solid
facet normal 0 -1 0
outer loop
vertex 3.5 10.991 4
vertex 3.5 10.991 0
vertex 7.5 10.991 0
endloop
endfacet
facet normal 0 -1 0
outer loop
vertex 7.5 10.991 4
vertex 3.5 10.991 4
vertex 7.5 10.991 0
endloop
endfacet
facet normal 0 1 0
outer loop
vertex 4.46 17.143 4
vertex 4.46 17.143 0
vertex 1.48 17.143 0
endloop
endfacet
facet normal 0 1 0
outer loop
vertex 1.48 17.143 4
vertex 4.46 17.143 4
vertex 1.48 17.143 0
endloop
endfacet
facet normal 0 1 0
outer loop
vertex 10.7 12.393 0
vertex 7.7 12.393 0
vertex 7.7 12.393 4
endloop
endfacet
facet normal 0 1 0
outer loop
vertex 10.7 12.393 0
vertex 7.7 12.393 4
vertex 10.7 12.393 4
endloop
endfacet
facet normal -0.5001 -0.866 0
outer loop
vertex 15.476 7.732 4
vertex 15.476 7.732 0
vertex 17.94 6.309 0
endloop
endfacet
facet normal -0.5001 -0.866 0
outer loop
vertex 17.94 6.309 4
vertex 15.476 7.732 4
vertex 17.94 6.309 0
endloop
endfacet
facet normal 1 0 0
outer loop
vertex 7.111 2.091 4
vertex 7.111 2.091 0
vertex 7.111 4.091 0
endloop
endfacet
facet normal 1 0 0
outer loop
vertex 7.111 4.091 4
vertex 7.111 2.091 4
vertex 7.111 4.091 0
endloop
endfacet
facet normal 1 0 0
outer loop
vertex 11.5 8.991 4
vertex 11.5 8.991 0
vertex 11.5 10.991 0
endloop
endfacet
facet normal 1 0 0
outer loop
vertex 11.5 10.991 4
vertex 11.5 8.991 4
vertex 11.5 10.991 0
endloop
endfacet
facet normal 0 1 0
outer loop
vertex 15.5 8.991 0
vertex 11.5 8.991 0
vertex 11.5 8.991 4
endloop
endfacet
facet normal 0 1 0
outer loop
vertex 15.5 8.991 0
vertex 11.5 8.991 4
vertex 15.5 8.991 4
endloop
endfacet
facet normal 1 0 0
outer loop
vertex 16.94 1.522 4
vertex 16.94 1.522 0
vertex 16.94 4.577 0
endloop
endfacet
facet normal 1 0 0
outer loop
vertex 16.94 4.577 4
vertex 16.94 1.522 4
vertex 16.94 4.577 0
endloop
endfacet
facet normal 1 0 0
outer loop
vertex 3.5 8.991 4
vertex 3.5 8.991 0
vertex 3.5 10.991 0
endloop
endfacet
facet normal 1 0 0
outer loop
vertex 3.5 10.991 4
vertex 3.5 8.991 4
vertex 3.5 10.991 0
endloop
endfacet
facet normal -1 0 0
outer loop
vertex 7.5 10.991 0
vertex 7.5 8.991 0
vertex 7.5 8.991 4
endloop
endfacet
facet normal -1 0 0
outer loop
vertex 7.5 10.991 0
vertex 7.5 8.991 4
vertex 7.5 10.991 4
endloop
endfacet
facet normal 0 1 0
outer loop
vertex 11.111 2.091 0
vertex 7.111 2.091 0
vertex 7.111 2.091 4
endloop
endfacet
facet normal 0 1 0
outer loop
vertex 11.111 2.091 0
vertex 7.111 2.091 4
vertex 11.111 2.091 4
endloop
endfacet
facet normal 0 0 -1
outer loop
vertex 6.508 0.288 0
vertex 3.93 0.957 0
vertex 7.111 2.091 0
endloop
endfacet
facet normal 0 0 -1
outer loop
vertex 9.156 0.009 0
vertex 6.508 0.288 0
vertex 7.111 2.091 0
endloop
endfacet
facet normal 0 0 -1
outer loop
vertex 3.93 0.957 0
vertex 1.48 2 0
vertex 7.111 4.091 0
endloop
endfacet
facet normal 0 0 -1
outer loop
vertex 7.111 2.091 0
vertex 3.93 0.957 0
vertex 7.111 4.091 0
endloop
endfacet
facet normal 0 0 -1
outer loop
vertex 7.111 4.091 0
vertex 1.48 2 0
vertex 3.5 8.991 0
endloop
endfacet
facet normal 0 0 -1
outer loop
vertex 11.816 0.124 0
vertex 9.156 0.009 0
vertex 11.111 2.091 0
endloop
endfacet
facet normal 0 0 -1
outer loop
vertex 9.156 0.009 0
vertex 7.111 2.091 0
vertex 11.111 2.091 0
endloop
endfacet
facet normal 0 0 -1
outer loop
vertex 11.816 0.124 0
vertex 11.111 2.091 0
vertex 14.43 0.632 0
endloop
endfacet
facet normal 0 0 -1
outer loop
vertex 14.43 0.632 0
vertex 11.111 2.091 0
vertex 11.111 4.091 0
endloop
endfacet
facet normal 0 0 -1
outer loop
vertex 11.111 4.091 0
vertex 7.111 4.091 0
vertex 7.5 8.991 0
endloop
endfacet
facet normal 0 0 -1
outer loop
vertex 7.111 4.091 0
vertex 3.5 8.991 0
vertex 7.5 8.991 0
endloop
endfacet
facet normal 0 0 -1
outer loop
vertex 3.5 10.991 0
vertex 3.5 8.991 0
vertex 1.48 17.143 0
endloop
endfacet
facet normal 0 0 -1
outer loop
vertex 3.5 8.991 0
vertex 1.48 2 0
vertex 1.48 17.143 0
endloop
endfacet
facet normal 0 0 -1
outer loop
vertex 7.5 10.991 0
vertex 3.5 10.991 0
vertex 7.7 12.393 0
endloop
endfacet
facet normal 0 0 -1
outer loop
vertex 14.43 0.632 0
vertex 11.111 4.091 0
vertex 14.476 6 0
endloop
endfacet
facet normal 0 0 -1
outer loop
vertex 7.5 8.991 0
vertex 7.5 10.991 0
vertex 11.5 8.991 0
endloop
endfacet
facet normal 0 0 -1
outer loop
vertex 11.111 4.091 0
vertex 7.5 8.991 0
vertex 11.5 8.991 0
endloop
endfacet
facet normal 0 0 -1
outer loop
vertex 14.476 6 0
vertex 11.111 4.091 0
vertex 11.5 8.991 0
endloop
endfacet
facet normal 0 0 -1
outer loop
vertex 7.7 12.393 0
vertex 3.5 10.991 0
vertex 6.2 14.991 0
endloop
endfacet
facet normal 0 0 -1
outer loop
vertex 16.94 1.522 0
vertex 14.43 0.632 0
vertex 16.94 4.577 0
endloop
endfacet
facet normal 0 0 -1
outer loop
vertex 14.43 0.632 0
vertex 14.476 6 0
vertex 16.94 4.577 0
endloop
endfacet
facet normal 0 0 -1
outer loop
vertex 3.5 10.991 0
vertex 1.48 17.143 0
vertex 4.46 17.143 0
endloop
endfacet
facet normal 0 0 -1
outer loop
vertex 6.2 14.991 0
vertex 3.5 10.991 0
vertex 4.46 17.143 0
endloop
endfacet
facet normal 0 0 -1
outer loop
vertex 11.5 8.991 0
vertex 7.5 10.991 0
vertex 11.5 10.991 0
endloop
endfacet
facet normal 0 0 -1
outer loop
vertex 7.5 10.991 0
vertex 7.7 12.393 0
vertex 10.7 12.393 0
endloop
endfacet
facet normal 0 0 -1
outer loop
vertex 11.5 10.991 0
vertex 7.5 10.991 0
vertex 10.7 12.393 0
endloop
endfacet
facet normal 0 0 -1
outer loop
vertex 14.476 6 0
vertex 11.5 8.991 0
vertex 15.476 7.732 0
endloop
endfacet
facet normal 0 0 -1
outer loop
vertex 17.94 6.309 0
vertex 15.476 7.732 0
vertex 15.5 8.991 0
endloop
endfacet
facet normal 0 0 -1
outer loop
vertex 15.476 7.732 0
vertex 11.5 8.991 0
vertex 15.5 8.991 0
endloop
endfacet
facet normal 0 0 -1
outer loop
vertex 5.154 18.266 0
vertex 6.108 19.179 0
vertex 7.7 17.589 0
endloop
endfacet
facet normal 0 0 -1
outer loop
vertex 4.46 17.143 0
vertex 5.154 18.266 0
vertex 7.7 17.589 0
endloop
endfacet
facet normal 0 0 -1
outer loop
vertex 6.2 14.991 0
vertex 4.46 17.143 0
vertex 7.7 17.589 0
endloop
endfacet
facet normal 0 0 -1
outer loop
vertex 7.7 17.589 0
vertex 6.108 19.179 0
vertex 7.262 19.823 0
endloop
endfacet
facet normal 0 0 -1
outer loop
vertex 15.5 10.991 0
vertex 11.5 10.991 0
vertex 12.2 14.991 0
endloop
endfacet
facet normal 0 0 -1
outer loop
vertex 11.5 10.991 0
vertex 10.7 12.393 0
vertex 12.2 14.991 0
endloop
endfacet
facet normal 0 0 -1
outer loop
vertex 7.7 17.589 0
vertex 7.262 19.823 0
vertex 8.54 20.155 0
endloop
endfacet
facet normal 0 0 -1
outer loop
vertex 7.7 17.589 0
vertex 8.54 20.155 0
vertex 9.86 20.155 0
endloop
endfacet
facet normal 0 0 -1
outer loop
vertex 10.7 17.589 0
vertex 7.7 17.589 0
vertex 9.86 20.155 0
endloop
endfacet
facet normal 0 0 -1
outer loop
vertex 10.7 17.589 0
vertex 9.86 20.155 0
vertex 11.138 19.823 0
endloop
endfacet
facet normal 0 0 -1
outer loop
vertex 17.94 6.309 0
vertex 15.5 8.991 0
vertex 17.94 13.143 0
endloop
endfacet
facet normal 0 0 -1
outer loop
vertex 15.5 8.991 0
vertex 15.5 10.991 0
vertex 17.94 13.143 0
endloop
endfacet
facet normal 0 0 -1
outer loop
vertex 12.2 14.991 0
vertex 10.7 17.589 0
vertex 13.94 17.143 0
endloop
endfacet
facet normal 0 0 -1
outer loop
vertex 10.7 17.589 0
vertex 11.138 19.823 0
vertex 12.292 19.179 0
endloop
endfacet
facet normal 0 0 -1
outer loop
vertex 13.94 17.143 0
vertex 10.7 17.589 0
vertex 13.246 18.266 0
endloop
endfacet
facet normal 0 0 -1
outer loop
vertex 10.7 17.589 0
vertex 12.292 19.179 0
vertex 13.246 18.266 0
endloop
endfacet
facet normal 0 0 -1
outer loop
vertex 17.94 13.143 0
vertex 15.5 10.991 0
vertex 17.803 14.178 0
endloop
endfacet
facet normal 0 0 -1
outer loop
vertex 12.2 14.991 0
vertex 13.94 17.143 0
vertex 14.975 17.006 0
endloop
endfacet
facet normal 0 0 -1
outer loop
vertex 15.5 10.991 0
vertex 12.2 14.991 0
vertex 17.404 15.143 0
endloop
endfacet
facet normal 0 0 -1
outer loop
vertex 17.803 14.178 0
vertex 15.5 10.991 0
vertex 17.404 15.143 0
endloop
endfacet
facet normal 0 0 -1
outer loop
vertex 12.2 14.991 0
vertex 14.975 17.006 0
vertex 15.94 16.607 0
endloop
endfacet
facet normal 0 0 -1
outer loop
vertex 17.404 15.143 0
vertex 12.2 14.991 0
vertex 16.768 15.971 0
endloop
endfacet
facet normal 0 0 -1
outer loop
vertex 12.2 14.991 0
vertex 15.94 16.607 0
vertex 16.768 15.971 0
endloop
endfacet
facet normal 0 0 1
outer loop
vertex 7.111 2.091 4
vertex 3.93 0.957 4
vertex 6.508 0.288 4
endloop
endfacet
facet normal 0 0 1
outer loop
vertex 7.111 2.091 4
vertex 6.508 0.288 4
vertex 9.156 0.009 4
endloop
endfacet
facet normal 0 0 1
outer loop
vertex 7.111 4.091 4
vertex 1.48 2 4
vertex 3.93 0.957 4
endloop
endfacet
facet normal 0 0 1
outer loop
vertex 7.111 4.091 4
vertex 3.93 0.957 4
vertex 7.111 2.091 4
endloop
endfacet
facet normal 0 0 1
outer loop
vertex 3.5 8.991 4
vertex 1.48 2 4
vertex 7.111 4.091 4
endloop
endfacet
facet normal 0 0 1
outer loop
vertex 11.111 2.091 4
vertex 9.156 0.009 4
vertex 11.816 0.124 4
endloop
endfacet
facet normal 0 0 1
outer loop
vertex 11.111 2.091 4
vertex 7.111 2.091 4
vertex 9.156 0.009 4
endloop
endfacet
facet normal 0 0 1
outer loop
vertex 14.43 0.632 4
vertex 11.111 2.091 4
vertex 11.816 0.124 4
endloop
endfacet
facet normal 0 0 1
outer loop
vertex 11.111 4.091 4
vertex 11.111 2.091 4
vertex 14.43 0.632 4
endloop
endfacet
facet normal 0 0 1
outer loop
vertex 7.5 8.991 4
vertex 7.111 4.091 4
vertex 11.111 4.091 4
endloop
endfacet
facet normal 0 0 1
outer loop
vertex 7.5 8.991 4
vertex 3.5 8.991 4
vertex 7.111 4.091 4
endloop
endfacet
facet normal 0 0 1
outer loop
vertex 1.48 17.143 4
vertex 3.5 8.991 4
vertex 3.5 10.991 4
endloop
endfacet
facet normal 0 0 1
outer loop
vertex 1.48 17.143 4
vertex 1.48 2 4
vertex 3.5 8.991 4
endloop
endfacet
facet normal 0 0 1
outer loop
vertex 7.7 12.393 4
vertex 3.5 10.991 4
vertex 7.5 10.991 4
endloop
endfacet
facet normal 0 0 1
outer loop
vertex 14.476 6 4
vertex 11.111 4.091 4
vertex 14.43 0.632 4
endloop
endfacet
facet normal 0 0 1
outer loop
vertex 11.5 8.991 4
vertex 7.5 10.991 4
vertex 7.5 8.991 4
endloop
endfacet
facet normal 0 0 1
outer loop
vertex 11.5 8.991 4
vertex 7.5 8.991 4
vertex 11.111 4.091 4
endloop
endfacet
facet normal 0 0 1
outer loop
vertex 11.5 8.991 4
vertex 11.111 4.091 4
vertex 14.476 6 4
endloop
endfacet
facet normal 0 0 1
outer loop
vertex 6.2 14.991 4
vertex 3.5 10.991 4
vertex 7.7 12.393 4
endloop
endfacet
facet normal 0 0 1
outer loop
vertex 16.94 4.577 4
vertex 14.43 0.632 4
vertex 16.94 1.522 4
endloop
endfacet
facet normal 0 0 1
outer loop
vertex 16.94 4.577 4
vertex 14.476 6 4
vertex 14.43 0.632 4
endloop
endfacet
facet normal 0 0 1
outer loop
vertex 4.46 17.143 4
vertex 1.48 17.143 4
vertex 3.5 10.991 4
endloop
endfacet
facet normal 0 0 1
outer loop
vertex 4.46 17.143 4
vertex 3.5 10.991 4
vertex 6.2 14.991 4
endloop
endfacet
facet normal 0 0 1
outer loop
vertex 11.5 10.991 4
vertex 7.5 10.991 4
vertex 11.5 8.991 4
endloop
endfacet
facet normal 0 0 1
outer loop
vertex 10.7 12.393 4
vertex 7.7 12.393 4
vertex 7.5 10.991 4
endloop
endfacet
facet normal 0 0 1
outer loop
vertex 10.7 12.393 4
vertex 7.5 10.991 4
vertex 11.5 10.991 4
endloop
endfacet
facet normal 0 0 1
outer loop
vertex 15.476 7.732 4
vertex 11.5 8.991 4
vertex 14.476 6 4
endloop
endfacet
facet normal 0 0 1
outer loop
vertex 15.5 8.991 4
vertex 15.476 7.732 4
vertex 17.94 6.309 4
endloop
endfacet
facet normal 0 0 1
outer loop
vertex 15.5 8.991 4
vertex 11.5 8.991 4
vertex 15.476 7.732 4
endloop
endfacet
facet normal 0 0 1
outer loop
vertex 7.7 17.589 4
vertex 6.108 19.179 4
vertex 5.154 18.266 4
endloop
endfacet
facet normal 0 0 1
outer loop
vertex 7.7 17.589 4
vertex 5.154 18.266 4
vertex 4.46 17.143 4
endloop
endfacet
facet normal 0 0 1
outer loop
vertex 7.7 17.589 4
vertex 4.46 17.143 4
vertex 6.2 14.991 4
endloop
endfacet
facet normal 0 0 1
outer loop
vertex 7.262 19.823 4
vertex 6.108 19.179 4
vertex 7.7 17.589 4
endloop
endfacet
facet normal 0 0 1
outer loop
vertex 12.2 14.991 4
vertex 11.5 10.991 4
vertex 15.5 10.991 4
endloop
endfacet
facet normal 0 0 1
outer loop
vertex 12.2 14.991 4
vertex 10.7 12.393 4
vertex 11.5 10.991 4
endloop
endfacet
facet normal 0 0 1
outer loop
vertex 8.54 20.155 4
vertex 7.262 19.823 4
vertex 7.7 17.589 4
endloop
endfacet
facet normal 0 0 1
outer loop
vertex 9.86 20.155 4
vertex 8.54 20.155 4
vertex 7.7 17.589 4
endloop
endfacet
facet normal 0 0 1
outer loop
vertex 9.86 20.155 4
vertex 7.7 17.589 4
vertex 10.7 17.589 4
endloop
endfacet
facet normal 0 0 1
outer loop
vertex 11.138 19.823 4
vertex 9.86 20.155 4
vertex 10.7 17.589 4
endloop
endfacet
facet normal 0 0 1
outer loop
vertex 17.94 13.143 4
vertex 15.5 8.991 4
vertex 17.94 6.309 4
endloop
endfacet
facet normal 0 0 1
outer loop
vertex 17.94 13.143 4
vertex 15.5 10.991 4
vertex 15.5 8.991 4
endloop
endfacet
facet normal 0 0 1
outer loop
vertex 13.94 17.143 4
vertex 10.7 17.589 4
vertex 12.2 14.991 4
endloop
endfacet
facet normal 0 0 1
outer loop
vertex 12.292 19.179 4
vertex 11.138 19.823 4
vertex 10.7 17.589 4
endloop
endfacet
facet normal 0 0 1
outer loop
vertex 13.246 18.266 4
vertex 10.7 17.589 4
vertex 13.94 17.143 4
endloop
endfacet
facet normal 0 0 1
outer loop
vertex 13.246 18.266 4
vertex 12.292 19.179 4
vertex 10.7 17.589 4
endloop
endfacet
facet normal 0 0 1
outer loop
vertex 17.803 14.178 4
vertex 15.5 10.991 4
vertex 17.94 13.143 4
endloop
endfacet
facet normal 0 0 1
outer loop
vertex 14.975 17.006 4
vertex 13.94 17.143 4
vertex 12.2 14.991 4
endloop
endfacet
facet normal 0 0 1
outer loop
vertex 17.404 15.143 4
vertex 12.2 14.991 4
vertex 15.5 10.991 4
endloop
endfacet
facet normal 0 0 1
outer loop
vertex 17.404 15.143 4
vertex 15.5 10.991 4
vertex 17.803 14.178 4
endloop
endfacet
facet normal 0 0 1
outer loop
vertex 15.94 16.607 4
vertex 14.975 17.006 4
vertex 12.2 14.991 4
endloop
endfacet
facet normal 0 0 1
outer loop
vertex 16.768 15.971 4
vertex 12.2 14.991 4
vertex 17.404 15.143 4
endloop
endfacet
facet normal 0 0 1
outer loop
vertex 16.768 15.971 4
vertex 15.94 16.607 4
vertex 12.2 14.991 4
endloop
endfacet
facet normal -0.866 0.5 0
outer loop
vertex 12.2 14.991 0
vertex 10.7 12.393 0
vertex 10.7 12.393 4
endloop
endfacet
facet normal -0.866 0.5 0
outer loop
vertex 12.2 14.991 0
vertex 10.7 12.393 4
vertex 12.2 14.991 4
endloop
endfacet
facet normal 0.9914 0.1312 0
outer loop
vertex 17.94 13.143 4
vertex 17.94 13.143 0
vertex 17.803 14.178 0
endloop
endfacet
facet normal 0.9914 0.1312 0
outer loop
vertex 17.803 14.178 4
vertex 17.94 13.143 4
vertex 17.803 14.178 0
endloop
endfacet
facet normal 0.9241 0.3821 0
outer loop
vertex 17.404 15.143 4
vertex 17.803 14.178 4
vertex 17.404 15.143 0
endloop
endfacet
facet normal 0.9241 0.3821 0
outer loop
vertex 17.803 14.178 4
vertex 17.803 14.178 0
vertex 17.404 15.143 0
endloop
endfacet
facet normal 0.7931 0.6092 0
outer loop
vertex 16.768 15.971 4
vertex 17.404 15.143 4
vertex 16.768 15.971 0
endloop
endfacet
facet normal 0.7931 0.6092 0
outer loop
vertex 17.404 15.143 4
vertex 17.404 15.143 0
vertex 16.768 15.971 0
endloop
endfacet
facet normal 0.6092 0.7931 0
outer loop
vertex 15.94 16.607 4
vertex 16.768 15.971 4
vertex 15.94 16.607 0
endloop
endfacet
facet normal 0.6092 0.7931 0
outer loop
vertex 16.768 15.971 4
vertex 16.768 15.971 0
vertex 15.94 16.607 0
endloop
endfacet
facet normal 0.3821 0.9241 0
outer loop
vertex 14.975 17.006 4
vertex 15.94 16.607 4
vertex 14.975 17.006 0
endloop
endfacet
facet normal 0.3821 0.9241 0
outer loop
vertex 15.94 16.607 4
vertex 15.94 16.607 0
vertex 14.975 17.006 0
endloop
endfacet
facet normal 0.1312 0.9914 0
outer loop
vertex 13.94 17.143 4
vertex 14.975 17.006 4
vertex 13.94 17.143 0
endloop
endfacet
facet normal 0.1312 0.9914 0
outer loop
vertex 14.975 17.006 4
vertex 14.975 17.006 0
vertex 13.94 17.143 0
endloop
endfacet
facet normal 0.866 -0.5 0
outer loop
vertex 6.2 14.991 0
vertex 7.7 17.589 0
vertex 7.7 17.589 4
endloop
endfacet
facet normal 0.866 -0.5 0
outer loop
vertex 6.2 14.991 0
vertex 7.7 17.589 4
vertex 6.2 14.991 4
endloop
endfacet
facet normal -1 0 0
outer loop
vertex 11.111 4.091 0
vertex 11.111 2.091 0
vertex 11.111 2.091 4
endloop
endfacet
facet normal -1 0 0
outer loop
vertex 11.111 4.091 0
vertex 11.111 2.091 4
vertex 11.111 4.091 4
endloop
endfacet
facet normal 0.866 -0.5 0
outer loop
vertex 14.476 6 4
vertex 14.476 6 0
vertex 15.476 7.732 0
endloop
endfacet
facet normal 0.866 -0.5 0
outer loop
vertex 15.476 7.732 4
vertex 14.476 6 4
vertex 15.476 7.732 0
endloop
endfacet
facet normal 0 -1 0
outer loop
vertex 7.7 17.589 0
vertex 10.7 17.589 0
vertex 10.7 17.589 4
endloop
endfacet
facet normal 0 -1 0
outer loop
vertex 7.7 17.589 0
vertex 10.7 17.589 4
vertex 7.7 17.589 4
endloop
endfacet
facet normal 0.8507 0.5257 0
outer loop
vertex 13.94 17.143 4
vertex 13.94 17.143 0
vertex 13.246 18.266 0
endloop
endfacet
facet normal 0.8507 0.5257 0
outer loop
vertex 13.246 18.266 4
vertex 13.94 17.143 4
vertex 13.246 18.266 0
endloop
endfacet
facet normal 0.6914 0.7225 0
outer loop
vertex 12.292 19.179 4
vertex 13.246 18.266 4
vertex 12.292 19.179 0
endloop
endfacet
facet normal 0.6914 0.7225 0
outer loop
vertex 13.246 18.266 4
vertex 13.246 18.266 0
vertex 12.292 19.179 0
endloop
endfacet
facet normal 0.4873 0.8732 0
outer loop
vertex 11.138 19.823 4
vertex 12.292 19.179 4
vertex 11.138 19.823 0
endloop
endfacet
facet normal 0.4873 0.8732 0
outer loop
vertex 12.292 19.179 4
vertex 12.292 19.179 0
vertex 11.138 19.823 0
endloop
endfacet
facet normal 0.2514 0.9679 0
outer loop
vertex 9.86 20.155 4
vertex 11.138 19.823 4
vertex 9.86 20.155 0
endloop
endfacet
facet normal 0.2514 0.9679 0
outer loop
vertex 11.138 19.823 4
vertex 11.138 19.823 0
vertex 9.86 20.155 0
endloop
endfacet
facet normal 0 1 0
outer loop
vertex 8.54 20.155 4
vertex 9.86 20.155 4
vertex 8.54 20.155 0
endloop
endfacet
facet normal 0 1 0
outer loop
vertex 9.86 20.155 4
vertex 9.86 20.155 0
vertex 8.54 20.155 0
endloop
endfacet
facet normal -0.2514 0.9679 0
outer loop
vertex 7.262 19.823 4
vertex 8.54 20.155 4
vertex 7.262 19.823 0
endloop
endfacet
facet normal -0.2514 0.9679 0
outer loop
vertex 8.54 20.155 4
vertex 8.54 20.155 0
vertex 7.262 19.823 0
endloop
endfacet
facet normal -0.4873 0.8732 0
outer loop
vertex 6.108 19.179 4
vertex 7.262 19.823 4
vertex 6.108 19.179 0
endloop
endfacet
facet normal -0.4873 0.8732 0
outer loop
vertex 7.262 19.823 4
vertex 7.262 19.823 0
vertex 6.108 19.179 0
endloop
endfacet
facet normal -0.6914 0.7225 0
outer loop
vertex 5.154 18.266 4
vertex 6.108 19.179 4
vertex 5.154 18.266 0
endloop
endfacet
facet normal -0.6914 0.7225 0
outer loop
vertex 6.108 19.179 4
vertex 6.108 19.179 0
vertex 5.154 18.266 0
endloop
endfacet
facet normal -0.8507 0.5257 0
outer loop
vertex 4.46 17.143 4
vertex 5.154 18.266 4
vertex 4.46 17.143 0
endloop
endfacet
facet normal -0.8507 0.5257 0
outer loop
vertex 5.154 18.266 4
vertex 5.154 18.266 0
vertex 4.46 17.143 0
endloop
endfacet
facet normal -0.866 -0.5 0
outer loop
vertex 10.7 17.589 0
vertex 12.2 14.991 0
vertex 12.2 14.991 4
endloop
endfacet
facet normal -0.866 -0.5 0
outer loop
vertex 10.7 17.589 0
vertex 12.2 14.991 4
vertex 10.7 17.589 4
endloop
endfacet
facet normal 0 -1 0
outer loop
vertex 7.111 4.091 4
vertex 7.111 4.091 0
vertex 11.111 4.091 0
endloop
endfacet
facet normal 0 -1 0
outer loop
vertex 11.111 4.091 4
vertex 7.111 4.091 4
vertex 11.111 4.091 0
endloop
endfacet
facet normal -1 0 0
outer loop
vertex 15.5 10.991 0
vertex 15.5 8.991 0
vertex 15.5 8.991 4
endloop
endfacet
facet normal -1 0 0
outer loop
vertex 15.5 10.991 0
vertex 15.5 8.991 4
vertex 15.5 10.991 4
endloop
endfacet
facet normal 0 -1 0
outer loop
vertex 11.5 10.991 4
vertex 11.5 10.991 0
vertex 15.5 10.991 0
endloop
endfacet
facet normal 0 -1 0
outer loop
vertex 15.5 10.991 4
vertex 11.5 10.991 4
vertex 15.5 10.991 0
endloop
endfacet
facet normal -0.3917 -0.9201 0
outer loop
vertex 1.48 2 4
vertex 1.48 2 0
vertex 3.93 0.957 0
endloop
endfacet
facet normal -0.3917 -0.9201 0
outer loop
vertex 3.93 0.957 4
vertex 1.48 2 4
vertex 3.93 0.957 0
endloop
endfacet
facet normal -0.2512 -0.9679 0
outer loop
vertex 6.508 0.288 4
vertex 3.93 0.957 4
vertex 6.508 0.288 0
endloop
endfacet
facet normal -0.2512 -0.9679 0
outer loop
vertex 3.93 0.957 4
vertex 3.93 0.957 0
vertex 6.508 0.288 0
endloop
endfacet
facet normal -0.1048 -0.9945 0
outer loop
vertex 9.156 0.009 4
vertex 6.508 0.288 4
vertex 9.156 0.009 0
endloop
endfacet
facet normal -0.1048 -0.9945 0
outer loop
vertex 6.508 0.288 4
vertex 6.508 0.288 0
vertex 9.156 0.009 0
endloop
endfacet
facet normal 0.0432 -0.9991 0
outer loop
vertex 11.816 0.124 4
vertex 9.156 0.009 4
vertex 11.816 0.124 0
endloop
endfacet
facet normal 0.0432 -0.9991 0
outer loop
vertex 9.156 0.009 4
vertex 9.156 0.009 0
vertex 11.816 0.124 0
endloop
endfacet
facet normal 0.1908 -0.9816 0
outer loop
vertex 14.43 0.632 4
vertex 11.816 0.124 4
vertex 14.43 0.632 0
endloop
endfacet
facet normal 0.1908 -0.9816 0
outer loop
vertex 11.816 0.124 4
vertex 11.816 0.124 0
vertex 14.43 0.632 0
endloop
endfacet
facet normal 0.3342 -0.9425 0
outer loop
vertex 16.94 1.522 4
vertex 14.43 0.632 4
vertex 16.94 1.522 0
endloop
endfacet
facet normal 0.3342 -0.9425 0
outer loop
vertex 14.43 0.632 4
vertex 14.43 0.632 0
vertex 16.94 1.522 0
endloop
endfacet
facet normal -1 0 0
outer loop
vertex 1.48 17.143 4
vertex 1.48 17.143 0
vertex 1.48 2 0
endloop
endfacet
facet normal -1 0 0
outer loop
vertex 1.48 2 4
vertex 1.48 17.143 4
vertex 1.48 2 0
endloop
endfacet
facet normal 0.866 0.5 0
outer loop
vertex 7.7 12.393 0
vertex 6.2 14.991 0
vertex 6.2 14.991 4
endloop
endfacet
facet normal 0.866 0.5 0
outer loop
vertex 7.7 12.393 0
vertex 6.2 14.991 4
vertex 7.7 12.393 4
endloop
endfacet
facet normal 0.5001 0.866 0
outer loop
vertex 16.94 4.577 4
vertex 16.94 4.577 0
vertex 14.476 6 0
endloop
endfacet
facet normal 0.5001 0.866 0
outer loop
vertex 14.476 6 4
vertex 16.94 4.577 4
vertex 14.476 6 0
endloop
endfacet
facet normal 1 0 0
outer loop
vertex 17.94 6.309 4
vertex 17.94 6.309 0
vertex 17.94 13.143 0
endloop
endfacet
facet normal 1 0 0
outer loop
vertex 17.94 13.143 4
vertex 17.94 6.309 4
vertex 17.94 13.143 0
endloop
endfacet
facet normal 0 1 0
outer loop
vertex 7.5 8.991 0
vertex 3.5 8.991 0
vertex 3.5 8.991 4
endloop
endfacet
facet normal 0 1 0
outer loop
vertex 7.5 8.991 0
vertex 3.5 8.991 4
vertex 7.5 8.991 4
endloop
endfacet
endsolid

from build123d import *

# Parameters (mm, degrees)
SKETCH1_W           = 4
SKETCH1_H           = 2
BOSS_EXTRUDE1_DEPTH = 4


with BuildPart() as part:
    # Sketch1 → Boss-Extrude1 (new body)
    with BuildSketch(Plane.XY):
        with BuildLine():
            Line((14.475572066, 6), (15.475572066, 7.732050808))
            Line((15.475572066, 7.732050808), (17.939673681, 6.309401077))
            Line((17.939673681, 6.309401077), (17.939673681, 13.142551265))
            ThreePointArc((17.939673681, 13.142551265), (16.768100806, 15.97097839), (13.939673681, 17.142551265))
            ThreePointArc((13.939673681, 17.142551265), (9.2, 20.197069168), (4.460326319, 17.142551265))
            Line((4.460326319, 17.142551265), (1.48, 17.142551265))
            Line((1.48, 17.142551265), (1.48, 2))
            ThreePointArc((1.48, 2), (9.155654032, 0.008565204), (16.939673681, 1.522010102))
            Line((16.939673681, 1.522010102), (16.939673681, 4.577350269))
            Line((16.939673681, 4.577350269), (14.475572066, 6))
        make_face()
        with Locations((5.5, 9.99107808)):
            Rectangle(SKETCH1_W, SKETCH1_H, mode=Mode.SUBTRACT)
        with Locations((9.111056117, 3.09107808)):
            Rectangle(SKETCH1_W, SKETCH1_H, mode=Mode.SUBTRACT)
        with Locations((13.5, 9.99107808)):
            Rectangle(SKETCH1_W, SKETCH1_H, mode=Mode.SUBTRACT)
        Polygon((6.2, 14.99107808), (7.7, 12.393001869), (10.7, 12.393001869), (12.2, 14.99107808), (10.7, 17.589154291), (7.7, 17.589154291), align=None, mode=Mode.SUBTRACT)
    extrude(amount=BOSS_EXTRUDE1_DEPTH)


solid = part.part
